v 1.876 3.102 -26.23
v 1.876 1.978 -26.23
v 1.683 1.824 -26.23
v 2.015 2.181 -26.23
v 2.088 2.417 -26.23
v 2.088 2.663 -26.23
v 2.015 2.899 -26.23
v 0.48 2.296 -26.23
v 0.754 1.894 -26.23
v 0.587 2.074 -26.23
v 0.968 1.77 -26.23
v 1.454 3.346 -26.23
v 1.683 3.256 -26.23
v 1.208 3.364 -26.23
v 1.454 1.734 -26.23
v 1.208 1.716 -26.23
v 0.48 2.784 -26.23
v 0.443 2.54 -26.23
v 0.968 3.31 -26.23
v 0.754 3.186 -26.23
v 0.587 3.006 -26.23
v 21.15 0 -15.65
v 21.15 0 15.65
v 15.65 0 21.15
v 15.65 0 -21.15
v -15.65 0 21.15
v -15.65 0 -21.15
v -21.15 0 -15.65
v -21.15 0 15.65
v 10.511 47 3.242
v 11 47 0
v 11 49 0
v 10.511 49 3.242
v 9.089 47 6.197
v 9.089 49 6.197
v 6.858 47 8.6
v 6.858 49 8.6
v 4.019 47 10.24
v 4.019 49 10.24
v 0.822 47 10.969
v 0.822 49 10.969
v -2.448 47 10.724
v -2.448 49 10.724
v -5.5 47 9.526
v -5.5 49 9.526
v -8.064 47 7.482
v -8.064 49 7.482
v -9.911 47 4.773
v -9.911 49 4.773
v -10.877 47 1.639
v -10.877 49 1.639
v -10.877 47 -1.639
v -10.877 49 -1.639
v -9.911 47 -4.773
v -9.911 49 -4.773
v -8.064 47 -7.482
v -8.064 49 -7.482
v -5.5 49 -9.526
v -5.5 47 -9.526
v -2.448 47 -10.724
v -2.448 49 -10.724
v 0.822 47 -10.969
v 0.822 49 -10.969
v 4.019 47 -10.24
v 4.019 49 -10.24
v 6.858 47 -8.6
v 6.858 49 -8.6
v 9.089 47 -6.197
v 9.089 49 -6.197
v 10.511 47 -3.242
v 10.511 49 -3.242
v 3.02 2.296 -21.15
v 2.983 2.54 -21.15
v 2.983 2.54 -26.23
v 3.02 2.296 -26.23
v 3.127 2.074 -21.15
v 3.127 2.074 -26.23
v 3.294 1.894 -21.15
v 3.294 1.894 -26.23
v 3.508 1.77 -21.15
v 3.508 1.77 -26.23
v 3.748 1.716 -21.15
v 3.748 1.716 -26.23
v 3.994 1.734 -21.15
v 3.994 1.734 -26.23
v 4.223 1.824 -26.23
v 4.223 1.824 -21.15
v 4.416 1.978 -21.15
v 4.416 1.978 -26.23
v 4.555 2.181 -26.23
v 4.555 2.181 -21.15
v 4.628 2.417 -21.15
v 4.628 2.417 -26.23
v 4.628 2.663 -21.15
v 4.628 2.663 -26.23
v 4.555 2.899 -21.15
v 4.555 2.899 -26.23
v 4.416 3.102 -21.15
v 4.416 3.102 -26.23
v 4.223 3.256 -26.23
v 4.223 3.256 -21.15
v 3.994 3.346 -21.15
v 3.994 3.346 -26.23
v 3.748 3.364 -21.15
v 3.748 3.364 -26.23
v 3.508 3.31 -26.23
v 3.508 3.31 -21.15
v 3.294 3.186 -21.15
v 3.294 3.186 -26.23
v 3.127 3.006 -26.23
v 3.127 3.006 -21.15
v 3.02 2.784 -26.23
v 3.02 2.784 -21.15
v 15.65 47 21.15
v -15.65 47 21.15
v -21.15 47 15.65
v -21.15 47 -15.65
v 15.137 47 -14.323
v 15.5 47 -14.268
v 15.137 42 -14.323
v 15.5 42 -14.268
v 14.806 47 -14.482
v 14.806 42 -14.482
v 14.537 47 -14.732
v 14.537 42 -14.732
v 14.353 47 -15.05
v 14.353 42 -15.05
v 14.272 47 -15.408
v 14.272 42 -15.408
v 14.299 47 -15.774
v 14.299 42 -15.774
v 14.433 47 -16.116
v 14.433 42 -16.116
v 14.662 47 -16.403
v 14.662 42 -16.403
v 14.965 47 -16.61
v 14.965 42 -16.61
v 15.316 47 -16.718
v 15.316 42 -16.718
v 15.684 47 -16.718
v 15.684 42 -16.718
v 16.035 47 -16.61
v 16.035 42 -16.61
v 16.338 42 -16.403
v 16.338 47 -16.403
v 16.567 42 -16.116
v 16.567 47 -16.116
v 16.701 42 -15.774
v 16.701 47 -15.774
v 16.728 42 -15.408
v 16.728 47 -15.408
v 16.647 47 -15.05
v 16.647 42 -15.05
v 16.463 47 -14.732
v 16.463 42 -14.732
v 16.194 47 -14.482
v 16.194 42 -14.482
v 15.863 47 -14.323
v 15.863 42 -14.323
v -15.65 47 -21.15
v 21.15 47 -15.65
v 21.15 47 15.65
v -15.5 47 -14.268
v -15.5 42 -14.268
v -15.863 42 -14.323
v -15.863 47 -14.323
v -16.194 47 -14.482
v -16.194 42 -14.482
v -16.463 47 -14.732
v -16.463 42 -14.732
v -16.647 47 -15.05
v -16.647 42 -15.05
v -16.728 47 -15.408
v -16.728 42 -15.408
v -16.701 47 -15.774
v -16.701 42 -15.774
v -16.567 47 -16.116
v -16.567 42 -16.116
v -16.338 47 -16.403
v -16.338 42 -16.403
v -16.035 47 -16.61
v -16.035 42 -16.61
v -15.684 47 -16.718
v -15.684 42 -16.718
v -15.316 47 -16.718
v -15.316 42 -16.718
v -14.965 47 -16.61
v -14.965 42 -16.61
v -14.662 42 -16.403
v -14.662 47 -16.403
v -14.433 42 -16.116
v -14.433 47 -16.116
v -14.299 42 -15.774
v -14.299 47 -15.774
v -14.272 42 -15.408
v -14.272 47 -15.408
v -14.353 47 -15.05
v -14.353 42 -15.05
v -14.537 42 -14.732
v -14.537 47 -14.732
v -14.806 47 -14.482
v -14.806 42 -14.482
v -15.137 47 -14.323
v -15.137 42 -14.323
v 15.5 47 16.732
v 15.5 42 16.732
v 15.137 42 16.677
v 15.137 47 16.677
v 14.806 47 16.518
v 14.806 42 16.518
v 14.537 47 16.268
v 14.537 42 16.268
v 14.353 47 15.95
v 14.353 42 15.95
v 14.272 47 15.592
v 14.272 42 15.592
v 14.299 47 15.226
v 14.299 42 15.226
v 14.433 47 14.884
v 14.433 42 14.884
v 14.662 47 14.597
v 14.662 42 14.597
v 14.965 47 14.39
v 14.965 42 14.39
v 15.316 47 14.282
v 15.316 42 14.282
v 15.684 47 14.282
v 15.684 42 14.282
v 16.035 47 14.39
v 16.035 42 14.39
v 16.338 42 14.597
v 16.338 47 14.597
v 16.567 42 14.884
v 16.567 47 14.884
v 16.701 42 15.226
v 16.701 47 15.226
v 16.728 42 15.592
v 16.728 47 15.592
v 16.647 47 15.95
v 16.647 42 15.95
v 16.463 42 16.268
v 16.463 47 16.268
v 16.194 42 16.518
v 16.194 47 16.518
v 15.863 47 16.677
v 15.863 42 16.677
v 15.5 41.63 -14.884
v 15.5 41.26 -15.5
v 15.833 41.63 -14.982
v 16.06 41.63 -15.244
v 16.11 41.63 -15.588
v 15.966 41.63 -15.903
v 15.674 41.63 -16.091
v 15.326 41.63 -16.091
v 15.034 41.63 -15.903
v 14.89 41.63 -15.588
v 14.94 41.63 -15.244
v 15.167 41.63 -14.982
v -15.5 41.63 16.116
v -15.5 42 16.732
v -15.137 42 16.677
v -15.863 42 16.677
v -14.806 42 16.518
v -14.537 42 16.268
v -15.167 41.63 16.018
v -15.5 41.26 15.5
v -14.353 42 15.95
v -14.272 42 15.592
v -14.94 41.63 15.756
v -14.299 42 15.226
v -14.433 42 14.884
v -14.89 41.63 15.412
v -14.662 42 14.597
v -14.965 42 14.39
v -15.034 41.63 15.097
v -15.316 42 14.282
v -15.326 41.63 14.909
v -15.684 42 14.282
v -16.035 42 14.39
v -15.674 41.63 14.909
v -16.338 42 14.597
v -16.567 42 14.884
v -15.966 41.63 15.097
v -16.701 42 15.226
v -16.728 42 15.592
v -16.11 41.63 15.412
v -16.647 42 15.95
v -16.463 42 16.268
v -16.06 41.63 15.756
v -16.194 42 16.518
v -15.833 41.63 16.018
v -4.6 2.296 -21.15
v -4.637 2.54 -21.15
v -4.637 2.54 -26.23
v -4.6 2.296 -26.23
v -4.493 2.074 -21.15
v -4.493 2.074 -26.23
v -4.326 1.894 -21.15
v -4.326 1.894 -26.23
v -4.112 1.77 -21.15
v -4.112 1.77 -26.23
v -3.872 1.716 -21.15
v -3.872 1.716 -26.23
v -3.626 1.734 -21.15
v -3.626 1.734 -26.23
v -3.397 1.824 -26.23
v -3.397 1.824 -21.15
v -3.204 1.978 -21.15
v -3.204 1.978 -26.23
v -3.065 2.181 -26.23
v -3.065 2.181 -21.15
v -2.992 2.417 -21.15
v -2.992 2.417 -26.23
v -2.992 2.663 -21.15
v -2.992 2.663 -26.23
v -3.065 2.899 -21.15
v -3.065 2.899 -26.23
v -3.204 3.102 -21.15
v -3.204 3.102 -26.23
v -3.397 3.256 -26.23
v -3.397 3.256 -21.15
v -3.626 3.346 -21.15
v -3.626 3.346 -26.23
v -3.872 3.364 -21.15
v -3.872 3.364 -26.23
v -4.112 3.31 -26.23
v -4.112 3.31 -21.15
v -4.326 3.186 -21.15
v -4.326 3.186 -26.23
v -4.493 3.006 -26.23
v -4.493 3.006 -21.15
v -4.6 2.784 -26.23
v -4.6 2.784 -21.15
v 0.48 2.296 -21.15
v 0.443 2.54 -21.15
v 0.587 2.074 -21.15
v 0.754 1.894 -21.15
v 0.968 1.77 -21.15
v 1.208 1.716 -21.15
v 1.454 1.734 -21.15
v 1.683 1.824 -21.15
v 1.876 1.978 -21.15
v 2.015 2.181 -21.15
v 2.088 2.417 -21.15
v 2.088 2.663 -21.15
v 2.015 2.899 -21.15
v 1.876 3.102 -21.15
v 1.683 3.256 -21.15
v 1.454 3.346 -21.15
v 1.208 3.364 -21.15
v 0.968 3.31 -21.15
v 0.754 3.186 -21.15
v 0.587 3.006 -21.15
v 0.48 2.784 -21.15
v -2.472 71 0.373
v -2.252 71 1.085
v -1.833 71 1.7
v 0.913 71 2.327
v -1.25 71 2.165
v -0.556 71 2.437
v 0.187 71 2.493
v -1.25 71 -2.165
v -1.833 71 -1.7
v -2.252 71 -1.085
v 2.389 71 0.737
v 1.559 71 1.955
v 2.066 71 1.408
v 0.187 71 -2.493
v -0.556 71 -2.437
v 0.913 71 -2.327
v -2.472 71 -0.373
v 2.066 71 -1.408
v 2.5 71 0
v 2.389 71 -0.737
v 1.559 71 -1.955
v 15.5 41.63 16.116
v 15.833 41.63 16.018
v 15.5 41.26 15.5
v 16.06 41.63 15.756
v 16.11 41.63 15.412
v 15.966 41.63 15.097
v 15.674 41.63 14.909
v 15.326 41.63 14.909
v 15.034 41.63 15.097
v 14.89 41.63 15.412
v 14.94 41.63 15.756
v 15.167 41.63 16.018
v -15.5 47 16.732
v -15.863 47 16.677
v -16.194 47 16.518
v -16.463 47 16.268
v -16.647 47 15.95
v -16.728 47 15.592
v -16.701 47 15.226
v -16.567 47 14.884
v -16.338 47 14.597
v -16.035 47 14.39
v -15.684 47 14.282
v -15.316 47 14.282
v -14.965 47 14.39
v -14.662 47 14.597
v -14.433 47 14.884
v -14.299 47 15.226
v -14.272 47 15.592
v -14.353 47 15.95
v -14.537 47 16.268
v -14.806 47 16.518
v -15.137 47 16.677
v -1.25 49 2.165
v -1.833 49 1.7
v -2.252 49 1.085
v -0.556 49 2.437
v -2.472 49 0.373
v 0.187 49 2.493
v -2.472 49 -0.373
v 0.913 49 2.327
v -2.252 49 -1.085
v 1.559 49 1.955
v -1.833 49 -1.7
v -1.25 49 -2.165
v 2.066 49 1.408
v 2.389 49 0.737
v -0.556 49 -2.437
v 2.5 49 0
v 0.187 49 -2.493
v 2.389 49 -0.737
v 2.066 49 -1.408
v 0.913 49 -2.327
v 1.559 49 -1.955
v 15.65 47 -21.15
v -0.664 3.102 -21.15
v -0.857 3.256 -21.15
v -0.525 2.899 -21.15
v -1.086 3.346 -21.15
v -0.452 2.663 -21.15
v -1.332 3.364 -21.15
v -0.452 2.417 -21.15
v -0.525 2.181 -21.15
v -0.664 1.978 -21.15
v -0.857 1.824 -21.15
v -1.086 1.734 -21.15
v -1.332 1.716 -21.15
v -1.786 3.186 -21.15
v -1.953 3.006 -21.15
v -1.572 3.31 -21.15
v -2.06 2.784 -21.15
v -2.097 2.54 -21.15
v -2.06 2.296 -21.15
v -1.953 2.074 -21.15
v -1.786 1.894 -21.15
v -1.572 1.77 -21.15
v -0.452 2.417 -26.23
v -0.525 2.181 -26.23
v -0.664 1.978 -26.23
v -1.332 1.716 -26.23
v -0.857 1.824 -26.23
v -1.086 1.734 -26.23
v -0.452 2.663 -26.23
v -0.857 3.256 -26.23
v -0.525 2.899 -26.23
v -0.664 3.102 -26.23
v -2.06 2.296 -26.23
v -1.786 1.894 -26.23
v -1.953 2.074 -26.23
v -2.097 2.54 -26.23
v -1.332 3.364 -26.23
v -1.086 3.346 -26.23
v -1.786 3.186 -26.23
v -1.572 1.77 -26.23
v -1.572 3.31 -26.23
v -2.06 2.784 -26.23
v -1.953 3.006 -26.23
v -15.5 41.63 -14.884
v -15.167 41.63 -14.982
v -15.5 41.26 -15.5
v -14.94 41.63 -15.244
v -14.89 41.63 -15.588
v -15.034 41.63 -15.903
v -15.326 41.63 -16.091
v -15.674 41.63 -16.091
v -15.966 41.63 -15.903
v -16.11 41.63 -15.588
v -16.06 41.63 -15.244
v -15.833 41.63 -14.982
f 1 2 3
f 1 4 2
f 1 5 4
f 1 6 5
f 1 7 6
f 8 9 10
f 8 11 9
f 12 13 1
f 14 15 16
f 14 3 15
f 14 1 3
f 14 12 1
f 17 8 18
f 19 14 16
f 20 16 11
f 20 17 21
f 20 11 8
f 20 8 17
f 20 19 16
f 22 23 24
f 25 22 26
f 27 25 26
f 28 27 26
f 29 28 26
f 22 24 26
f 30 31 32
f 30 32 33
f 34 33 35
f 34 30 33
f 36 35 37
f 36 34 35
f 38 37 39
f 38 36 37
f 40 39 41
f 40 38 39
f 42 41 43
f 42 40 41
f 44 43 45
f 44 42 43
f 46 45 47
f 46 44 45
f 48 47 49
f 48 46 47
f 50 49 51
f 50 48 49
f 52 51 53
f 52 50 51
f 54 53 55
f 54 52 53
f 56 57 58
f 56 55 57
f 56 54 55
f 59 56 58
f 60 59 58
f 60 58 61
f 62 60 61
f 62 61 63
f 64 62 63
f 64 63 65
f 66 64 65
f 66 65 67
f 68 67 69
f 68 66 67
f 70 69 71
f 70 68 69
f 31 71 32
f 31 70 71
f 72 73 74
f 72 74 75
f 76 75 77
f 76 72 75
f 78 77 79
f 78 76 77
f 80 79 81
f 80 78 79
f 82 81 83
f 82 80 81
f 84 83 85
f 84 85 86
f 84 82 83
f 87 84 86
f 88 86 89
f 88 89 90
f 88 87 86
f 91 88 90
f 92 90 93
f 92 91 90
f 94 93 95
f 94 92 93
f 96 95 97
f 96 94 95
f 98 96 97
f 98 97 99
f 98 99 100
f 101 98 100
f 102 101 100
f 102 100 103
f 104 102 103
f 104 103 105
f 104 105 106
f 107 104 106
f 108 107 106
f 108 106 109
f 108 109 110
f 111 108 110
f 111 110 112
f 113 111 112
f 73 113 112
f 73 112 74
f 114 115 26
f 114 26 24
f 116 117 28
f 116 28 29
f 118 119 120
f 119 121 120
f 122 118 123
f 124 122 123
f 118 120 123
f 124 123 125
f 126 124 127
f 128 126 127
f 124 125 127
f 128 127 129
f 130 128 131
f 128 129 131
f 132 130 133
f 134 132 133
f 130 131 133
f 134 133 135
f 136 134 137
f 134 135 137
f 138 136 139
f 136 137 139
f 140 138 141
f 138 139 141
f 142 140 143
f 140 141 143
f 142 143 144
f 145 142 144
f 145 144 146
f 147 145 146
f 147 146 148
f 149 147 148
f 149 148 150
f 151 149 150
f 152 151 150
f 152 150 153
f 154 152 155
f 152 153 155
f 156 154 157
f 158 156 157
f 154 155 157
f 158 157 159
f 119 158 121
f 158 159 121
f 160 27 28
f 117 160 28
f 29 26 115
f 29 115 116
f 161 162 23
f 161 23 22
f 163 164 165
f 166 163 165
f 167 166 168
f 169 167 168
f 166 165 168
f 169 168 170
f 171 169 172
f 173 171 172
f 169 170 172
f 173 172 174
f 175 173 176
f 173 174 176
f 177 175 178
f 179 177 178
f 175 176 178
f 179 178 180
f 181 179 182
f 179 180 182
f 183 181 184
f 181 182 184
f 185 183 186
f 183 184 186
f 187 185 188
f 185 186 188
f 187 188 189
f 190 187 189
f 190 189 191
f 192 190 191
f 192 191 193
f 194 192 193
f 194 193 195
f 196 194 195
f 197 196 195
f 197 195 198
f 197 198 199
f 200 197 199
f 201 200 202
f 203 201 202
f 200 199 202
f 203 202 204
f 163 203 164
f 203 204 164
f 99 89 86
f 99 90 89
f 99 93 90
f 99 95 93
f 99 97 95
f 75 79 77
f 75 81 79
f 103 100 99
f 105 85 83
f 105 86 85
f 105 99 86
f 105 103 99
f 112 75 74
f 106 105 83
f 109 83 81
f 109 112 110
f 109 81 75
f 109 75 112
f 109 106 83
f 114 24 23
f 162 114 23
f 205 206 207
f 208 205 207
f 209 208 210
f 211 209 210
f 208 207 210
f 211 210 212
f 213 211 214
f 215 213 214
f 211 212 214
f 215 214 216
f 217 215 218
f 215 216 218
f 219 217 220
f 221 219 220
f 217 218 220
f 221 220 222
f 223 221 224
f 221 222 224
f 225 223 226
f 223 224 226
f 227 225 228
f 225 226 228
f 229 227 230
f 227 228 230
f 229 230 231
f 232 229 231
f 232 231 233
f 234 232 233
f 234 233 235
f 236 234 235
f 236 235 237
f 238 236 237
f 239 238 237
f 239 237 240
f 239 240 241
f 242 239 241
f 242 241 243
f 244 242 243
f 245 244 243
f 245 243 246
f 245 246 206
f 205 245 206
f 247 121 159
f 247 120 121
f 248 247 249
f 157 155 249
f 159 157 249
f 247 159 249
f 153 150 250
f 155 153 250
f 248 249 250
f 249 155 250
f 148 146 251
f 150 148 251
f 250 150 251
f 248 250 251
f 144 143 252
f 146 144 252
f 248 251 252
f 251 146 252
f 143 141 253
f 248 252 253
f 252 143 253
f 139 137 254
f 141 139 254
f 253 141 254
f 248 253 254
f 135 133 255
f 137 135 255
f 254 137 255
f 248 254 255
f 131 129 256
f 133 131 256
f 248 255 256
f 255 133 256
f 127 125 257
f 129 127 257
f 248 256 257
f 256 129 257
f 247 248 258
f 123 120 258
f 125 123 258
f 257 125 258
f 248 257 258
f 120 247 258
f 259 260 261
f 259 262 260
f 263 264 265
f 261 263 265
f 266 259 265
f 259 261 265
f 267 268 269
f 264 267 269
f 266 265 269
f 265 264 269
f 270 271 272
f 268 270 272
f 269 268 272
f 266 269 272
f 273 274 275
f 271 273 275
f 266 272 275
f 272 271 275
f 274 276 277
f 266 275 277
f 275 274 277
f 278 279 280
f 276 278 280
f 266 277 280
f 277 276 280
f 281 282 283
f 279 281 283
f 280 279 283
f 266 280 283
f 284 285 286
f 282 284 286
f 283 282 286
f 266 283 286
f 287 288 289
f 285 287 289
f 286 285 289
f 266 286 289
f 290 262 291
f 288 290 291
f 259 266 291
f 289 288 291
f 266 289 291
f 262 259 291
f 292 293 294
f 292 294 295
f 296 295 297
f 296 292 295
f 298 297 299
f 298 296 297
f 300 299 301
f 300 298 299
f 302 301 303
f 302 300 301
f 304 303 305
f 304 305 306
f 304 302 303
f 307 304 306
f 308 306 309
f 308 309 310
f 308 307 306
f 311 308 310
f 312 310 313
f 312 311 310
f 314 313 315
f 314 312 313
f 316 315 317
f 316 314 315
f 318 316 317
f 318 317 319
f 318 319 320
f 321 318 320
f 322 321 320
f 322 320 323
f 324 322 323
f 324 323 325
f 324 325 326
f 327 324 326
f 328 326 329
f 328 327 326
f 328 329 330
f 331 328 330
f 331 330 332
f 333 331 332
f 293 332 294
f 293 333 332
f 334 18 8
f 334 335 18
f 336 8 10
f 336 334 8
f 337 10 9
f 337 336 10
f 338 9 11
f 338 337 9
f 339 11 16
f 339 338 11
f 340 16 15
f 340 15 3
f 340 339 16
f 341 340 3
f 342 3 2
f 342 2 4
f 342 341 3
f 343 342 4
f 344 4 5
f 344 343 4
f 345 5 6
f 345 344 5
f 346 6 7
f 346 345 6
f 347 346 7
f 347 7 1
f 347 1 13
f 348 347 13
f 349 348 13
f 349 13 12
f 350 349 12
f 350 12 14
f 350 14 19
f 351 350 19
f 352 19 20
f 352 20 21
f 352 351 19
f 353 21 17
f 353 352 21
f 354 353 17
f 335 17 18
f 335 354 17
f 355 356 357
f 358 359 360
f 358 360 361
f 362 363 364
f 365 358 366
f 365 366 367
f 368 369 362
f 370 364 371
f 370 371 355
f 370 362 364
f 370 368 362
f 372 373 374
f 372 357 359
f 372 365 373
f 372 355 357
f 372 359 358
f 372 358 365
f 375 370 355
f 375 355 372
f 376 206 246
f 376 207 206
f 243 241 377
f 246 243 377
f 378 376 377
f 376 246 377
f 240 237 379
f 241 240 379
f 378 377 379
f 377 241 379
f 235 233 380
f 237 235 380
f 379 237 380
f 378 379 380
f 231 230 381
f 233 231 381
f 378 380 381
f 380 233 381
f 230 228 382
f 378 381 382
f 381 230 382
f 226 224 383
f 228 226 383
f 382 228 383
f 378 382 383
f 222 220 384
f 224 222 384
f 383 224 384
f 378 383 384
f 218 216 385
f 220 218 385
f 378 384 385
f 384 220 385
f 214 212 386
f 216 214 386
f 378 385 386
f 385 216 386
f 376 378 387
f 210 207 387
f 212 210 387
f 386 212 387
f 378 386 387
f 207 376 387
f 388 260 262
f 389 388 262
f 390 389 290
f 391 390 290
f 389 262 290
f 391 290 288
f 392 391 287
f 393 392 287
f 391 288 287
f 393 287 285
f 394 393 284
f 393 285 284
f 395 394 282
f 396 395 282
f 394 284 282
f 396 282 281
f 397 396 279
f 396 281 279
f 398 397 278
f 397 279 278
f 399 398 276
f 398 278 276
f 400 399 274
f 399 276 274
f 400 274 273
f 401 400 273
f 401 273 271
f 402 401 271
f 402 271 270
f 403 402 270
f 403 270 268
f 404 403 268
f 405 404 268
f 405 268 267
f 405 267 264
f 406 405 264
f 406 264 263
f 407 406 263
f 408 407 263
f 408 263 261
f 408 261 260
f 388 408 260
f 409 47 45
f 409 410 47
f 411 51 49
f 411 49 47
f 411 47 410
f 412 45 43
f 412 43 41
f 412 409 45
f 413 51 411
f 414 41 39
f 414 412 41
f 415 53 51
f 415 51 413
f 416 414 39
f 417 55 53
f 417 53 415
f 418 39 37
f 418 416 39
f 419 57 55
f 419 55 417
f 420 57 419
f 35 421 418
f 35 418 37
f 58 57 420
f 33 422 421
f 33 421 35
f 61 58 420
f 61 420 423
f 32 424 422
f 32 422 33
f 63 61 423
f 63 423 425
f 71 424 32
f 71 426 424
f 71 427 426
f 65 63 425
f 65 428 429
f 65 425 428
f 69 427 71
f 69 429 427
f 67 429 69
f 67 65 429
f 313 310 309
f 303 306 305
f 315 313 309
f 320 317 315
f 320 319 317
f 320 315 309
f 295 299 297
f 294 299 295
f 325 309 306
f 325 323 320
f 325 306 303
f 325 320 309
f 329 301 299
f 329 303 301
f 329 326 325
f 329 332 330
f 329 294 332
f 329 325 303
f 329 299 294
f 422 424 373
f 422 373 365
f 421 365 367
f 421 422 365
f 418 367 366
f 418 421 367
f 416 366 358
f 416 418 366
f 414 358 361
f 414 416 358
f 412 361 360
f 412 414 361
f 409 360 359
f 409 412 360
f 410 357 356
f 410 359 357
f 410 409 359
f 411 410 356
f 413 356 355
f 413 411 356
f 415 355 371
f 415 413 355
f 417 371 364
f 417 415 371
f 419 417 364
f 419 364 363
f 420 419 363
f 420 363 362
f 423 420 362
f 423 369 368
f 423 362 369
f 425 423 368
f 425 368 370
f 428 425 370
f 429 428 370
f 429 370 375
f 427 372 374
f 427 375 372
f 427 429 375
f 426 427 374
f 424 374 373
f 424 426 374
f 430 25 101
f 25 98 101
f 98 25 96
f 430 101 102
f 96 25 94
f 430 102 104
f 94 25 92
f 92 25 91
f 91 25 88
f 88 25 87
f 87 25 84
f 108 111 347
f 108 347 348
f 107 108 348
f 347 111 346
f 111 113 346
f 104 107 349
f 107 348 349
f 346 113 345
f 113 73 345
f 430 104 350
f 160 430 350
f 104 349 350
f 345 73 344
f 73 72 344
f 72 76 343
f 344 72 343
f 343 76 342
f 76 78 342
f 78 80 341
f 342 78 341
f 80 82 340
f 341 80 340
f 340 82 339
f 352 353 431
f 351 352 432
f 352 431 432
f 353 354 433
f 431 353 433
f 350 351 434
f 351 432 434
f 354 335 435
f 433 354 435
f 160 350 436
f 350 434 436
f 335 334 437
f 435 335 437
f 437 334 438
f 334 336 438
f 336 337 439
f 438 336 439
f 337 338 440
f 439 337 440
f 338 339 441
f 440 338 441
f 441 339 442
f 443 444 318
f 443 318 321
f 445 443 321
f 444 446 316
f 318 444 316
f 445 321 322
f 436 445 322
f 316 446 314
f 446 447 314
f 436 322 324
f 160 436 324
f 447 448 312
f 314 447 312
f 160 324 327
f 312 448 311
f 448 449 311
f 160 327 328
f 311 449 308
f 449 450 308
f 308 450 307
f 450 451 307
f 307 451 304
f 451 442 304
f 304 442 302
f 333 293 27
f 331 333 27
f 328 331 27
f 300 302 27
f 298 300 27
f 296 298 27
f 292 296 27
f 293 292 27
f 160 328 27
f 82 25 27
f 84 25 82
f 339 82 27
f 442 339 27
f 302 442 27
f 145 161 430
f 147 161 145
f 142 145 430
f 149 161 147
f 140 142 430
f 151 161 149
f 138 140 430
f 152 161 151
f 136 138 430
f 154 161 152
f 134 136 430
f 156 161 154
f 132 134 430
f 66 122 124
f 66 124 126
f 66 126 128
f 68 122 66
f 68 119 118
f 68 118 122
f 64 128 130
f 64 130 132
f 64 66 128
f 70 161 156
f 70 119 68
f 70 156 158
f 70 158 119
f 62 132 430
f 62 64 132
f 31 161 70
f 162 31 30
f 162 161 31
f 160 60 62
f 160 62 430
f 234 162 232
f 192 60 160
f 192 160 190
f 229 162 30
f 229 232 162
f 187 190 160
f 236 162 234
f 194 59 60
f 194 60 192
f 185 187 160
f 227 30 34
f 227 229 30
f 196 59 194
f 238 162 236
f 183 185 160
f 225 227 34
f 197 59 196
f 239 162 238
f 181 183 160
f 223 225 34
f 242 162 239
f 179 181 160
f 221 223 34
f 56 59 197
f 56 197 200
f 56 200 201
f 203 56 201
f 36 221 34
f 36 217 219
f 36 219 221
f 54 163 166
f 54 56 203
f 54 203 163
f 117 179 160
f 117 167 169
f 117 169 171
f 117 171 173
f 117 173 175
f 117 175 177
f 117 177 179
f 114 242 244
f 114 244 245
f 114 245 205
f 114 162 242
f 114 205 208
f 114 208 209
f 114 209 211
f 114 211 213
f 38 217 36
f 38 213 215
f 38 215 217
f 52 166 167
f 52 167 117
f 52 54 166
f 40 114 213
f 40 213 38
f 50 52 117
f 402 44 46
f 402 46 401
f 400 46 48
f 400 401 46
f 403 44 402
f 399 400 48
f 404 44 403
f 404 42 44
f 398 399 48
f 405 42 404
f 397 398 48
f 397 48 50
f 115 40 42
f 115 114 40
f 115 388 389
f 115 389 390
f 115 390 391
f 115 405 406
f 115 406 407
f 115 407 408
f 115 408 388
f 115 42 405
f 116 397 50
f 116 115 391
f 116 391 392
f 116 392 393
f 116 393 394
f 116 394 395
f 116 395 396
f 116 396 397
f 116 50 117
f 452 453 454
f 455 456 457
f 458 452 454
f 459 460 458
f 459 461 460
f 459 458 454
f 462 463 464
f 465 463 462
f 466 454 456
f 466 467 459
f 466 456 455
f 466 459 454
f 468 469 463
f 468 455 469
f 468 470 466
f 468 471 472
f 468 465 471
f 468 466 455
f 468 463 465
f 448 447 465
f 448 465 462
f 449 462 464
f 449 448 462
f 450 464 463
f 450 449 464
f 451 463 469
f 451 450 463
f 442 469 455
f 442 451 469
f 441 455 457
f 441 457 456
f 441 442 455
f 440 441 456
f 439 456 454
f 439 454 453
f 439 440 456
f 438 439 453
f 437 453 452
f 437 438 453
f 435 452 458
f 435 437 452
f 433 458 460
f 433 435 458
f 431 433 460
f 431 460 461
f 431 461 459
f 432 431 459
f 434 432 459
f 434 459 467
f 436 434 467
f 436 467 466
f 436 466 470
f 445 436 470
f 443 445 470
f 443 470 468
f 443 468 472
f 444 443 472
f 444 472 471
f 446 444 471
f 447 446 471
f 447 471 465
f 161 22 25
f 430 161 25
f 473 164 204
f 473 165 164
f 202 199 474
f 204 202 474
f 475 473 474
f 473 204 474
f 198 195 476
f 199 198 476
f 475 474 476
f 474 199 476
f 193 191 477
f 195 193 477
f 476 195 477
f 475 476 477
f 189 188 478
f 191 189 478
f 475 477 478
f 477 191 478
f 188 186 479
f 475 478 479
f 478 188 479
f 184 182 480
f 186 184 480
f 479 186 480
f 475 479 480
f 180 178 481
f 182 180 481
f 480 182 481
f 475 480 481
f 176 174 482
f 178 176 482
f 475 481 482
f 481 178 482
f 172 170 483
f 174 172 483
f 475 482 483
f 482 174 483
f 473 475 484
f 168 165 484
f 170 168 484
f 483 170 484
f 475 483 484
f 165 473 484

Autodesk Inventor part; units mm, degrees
ref_plane "YZ Plane" through (0, 0, 0) normal (1, 0, 0) x (0, 1, 0)
ref_plane "XZ Plane" through (0, 0, 0) normal (0, 1, 0) x (-1, 0, 0)
ref_plane "XY Plane" through (0, 0, 0) normal (0, 0, 1) x (1, 0, 0)
sketch "Sketch1" plane through (0, 0, 0) normal (0, 1, 0) x (-1, 0, 0)
  line L0 (-15.65, -21.15) -> (15.65, -21.15)
  line L1 (21.15, -15.65) -> (21.15, 15.65)
  line L2 (15.65, 21.15) -> (-15.65, 21.15)
  line L3 (-21.15, 15.65) -> (-21.15, -15.65)
  line L4 (-21.15, -21.15) -> (21.15, 21.15) construction
  line L5 (21.15, -21.15) -> (-21.15, 21.15) construction
  line L6 (15.65, 21.15) -> (21.15, 15.65)
  line L7 (-15.65, 21.15) -> (-21.15, 15.65)
  line L8 (-21.15, -15.65) -> (-15.65, -21.15)
  line L9 (15.65, -21.15) -> (21.15, -15.65)
  point P0 (0, 0)
  dimension "d0" = 42.3
  dimension "d1" = 42.3
  dimension "d2" = 5.5
  dimension "d3" = 5.5
  dimension "d4" = 5.5
  dimension "d5" = 5.5
  dimension "d6" = 5.5
  dimension "d7" = 5.5
  dimension "d8" = 5.5
  dimension "d9" = 5.5
extrude "Extrusion1" add sketch "Sketch1" along normal blind 47
sketch "Sketch2" plane through (0, 47, 0) normal (0, 1, 0) x (1, 0, 0)
  circle A0 centre (0, 0) radius 11
  dimension "d12" = 22
extrude "Extrusion2" add sketch "Sketch2" along normal blind 2
sketch "Sketch3" plane through (0, 49, 0) normal (0, 1, 0) x (1, 0, 0)
  circle A0 centre (0, 0) radius 2.5
  dimension "d15" = 5
extrude "Extrusion3" add sketch "Sketch3" along normal blind 22
sketch "Sketch4" plane through (0, 47, 0) normal (0, 1, 0) x (1, 0, 0)
  line L0 (89.125, 0) -> (-55.025, 0)
  line L1 (0, 94.2917) -> (0, -108.2417)
  point P0 (0, 0)
  point P1 (15.5, 15.5)
  point P2 (15.5, -15.5)
  point P3 (-15.5, 15.5)
  point P4 (-15.5, -15.5)
  dimension "d18" = 31
  dimension "d19" = 31
hole "Hole1" at (15.5, 47, -15.5) at (15.5, 47, 15.5) at (-15.5, 47, -15.5) at (-15.5, 47, 15.5) direction (0, -1, 0) diameter 2.4638 depth 5 tip angle 118
sketch "Sketch6" plane through (15.65, 0, -21.15) normal (0, 0, -1) x (-1, 0, 0)
  line L0 (15.65, -0.9377) -> (15.65, 31.0797)
  line L1 (31.3, 0) -> (0, 0) projected
  circle A0 centre (11.84, 2.54) radius 0.8268
  circle A1 centre (14.38, 2.54) radius 0.8268
  line L2 (6.0146, 2.54) -> (34.3637, 2.54)
  circle A2 centre (19.46, 2.54) radius 0.8268
  circle A3 centre (16.92, 2.54) radius 0.8268
  point P0 (15.65, 0)
  point P1 (15.65, 0)
  dimension "d31" = 2.54
  dimension "d32" = 2.54
  dimension "d33" = 1.6536
  dimension "d34" = 1.6536
  dimension "d36" = 2.54
extrude "Extrusion6" add sketch "Sketch6" along normal blind 5.08
equation "\"d1\" = d0"
equation "\"d3\" = d2"
equation "\"d4\" = d2"
equation "\"d5\" = d4"
equation "\"d6\" = d2"
equation "\"d7\" = d6"
equation "\"d8\" = d2"
equation "\"d9\" = d8"
equation "\"d32\" = d31"
equation "\"d34\" = d33"
properties part number "Stepper_Motor"
